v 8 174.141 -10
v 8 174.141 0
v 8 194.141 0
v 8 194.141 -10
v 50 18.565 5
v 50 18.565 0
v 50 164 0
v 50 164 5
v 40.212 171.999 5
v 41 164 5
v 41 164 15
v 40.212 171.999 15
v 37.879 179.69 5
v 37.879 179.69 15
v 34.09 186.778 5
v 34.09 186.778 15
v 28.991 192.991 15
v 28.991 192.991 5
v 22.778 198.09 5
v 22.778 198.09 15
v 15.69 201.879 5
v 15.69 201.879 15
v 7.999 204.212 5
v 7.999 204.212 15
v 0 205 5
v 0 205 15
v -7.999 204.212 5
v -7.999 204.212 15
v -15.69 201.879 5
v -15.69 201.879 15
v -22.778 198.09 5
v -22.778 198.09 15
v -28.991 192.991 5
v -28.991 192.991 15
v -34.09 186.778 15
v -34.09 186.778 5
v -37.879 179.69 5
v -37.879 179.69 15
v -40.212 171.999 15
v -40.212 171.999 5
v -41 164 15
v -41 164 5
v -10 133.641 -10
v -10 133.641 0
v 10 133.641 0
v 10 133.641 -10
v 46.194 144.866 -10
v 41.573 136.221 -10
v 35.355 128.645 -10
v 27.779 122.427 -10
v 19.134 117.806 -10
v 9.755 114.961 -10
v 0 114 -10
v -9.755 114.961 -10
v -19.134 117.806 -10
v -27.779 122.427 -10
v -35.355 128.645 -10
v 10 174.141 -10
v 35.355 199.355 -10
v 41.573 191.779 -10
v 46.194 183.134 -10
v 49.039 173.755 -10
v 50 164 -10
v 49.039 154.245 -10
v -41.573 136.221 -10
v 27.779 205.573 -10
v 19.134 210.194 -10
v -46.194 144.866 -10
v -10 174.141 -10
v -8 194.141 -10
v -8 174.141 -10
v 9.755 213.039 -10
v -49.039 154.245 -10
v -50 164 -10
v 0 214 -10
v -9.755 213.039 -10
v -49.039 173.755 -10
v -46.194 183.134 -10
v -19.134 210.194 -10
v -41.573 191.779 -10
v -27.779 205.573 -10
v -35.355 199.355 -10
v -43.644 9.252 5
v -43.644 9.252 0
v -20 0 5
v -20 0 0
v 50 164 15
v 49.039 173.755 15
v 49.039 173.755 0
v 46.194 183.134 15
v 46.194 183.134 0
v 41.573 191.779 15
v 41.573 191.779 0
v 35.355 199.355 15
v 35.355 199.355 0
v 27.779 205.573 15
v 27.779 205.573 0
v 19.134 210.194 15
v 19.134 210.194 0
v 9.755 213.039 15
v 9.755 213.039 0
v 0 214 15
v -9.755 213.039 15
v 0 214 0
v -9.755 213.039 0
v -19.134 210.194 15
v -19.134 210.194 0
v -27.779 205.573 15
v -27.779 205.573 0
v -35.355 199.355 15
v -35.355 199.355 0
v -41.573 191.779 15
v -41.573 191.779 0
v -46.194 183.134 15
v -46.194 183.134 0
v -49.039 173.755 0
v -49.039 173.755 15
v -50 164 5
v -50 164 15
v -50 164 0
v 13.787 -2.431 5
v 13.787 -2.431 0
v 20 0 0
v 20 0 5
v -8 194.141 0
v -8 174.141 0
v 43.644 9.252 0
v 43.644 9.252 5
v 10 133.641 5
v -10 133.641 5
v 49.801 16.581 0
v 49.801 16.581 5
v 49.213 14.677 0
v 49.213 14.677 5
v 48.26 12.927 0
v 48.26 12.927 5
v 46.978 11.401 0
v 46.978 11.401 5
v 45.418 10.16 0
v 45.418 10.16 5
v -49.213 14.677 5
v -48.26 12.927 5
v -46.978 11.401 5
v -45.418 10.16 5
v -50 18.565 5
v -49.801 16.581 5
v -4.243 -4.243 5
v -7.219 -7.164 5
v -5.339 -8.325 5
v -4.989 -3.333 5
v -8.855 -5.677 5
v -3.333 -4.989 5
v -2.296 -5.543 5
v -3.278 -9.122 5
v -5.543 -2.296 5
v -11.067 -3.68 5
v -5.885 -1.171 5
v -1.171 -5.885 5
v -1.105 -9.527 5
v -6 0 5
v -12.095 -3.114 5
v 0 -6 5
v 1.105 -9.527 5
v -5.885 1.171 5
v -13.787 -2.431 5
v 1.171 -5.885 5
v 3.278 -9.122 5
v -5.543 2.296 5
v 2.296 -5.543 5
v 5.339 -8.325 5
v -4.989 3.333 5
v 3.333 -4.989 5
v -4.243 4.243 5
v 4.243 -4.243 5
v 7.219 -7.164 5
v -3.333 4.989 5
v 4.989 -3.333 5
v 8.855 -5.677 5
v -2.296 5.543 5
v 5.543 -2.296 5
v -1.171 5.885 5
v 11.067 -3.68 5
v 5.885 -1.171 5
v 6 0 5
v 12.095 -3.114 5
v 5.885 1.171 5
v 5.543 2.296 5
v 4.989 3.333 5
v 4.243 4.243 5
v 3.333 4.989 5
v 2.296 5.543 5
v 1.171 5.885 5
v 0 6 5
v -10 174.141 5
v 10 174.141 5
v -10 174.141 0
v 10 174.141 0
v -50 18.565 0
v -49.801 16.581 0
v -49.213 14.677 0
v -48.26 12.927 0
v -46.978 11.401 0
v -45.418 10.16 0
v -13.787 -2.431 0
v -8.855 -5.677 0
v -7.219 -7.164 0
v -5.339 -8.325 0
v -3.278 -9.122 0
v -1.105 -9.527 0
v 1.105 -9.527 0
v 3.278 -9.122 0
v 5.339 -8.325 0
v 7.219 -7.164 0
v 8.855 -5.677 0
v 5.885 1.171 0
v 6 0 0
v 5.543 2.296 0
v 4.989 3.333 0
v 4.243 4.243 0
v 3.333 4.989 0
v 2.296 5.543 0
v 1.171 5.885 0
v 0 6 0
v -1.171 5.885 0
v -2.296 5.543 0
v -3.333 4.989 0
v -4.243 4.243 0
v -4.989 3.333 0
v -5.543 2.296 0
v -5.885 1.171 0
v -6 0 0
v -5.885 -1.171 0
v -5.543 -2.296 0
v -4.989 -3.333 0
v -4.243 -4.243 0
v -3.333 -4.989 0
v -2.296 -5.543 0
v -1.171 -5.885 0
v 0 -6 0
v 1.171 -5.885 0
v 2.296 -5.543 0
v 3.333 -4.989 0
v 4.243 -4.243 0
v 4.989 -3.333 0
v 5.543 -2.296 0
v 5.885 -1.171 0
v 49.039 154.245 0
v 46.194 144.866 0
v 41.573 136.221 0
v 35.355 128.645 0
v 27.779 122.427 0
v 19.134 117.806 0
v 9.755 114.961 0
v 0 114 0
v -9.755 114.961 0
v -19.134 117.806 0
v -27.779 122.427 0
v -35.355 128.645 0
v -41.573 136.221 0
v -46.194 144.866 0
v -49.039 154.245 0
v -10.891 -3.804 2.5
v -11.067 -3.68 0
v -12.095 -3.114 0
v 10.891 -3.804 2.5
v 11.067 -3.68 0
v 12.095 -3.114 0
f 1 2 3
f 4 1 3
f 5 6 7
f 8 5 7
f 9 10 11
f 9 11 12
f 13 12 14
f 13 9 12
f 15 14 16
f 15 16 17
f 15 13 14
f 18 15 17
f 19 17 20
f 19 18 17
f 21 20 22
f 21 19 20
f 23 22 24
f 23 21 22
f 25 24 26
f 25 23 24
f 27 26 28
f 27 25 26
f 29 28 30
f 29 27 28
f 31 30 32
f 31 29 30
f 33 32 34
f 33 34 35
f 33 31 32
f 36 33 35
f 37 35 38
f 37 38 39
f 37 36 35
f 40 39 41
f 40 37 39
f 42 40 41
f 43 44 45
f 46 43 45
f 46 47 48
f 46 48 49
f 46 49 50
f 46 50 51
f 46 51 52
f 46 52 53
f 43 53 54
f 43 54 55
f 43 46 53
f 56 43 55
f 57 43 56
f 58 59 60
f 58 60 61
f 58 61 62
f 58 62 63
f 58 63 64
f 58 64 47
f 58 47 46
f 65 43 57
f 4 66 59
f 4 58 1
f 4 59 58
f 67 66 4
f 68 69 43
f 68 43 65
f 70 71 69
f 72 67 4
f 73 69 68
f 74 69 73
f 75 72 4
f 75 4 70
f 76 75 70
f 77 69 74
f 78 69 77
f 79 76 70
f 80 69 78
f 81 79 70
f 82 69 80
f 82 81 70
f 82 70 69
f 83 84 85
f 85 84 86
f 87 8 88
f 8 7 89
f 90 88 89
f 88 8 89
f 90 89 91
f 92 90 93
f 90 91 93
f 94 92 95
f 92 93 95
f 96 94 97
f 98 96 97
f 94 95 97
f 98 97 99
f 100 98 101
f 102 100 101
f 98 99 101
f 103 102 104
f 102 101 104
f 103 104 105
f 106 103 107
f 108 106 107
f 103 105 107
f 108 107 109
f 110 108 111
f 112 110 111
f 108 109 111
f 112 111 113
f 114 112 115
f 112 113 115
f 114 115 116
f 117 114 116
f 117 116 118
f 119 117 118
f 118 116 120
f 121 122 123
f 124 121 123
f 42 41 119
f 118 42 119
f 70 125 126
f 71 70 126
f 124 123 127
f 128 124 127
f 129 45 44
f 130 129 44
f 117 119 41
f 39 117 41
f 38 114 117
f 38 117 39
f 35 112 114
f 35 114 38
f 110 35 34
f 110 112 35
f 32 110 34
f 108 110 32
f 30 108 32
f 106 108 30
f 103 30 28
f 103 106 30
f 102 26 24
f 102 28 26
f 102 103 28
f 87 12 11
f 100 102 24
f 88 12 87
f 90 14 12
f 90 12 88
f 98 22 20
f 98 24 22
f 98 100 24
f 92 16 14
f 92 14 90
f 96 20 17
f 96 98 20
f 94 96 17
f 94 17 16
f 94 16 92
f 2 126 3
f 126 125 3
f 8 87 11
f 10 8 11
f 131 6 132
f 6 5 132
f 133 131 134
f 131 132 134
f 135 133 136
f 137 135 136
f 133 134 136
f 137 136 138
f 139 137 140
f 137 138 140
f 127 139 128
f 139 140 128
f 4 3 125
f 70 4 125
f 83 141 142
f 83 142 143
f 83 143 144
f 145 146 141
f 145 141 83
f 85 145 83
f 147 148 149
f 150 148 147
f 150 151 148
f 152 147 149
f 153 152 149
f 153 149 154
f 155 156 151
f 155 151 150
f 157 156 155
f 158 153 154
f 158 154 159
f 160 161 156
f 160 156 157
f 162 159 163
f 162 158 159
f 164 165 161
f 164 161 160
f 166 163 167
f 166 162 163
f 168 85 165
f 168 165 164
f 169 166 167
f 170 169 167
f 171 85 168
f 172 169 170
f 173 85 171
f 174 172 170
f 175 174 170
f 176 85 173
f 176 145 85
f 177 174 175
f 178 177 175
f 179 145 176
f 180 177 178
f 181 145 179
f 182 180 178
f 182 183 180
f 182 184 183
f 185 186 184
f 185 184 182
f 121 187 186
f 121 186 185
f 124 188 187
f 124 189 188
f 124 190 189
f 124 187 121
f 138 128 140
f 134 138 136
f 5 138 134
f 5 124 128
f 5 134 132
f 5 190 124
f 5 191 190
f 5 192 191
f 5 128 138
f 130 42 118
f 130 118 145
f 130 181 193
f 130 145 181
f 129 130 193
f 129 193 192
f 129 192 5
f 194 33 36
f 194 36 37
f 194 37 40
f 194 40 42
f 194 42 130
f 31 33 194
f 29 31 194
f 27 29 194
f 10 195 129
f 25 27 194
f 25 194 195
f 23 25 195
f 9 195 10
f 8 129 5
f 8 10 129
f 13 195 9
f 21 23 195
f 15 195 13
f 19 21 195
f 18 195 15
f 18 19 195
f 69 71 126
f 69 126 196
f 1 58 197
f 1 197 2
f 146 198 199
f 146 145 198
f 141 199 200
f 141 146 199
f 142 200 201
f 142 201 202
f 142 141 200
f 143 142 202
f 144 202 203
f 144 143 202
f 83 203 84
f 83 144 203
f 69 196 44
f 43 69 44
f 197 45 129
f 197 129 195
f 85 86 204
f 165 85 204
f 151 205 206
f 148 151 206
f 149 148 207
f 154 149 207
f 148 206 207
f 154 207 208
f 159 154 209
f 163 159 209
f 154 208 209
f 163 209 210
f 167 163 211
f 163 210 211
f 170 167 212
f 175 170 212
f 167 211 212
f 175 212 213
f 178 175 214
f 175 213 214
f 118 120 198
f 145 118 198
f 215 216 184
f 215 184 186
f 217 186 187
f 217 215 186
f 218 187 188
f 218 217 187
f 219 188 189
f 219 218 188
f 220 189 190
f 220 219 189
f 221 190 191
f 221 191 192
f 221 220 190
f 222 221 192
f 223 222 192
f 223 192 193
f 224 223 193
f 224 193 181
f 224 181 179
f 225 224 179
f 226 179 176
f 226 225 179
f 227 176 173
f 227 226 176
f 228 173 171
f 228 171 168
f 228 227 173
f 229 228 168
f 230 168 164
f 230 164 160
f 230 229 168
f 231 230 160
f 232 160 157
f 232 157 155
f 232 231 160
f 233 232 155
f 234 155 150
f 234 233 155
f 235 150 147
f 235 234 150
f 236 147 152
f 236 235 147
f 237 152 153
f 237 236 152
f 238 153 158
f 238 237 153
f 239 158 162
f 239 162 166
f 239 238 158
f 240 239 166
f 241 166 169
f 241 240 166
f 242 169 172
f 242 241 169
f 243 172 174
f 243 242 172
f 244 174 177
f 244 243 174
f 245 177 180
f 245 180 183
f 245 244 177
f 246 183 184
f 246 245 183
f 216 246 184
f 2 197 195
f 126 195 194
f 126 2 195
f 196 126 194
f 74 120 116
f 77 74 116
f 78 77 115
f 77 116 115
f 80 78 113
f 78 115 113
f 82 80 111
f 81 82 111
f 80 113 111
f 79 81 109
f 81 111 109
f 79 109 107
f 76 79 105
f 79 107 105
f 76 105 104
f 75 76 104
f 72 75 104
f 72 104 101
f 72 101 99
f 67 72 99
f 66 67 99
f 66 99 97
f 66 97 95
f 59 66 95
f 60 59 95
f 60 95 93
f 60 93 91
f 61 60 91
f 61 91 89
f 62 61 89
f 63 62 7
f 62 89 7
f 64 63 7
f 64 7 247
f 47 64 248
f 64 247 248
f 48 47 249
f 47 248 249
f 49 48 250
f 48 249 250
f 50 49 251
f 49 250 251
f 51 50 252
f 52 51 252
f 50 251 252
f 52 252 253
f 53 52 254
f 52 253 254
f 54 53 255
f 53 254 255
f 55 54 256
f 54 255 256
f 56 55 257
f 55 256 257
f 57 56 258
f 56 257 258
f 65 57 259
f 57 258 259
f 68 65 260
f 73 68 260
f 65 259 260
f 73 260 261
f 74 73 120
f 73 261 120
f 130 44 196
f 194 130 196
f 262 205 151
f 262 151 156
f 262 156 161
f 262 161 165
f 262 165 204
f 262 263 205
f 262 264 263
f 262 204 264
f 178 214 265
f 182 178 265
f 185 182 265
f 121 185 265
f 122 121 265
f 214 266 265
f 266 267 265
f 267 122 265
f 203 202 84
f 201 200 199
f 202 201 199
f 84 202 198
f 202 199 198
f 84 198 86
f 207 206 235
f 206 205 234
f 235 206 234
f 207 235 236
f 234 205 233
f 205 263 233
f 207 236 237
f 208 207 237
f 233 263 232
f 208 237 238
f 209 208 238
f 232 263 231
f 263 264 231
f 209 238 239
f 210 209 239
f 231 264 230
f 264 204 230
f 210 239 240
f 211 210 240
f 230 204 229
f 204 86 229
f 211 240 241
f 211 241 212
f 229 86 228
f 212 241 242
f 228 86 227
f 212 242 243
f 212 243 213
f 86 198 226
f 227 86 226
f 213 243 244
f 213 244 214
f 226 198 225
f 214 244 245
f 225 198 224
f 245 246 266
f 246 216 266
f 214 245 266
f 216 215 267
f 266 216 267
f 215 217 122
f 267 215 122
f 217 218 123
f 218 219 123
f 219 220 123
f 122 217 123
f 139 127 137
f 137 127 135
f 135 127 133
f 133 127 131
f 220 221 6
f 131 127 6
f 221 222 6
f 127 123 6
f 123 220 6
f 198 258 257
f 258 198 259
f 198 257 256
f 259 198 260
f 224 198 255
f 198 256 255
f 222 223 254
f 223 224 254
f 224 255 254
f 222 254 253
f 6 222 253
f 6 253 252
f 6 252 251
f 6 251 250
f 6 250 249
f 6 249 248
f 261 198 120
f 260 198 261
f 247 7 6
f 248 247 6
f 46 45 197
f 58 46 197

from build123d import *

# Parameters (mm, degrees)
CROQUIS1_R              = 6
SALIENTE_EXTRUIR1_DEPTH = 5
REDONDEO1_R             = 10
REDONDEO3_R             = 10
CROQUIS2_R              = 50
CROQUIS2_R_2            = 41
SALIENTE_EXTRUIR3_DEPTH = 10
CROQUIS3_W              = 20
CROQUIS3_H              = 40.5
CORTAR_EXTRUIR1_DEPTH   = 10
CORTAR_EXTRUIR2_DEPTH   = 10
CROQUIS5_R              = 50
SALIENTE_EXTRUIR4_DEPTH = 10


with BuildPart() as part:
    # Croquis1 → Saliente-Extruir1 (new body)
    with BuildSketch(Plane.XY):
        with BuildLine():
            ThreePointArc((50, 164), (0, 214), (-50, 164))
            Line((-50, 164), (-50, 11.739233328))
            Line((-50, 11.739233328), (-20, 0))
            Line((-20, 0), (-13.787308542, -2.431074487))
            add(Edge.make_bspline(
                [(-8.854817181, -5.677302066), (-9.51760475, -5.090344722), (-10.900654261, -3.469047842), (-12.711160318, -2.852179657), (-13.787308542, -2.431074487)],
                knots=[0.517708821, 0.517708821, 0.517708821, 0.517708821, 0.741171884, 1, 1, 1, 1], degree=3))
            ThreePointArc((-8.854817181, -5.677302066), (0, -9.578400122), (8.854817181, -5.677302066))
            add(Edge.make_bspline(
                [(8.854817181, -5.677302066), (9.51760475, -5.090344722), (10.900654261, -3.469047842), (12.711160318, -2.852179657), (13.787308542, -2.431074487)],
                knots=[0.517708821, 0.517708821, 0.517708821, 0.517708821, 0.741171884, 1, 1, 1, 1], degree=3))
            Line((13.787308542, -2.431074487), (20, 0))
            Line((20, 0), (50, 11.739233328))
            Line((50, 11.739233328), (50, 164))
        make_face()
        Circle(CROQUIS1_R, mode=Mode.SUBTRACT)
    extrude(amount=SALIENTE_EXTRUIR1_DEPTH)

    # Redondeo1
    redondeo1_edges = [part.edges().sort_by_distance(p)[0] for p in [
        (50, 11.739233328, 2.5),
    ]]
    fillet(redondeo1_edges, radius=REDONDEO1_R)

    # Redondeo3
    redondeo3_edges = [part.edges().sort_by_distance(p)[0] for p in [
        (-50, 11.739233328, 2.5),
    ]]
    fillet(redondeo3_edges, radius=REDONDEO3_R)

    # Croquis2 → Saliente-Extruir3 (add)
    with BuildSketch(Plane.XY.offset(5)):
        with Locations((0, 164)):
            Circle(CROQUIS2_R)
        with Locations((0, 164)):
            Circle(CROQUIS2_R_2, mode=Mode.SUBTRACT)
    extrude(amount=SALIENTE_EXTRUIR3_DEPTH)

    # Croquis3 → Cortar-Extruir1 (cut)
    with BuildSketch(Plane(origin=(0, 0, 0), x_dir=(-1, 0, 0), z_dir=(0, 0, -1))):
        with Locations((0, 153.891101056)):
            Rectangle(CROQUIS3_W, CROQUIS3_H)
    extrude(amount=-CORTAR_EXTRUIR1_DEPTH, mode=Mode.SUBTRACT)

    # Croquis4 → Cortar-Extruir2 (cut)
    with BuildSketch(Plane.XY.offset(15)):
        with BuildLine():
            Line((-41, 164), (-50, 164))
            ThreePointArc((-50, 164), (0, 114), (50, 164))
            Line((50, 164), (41, 164))
            ThreePointArc((41, 164), (0, 123), (-41, 164))
        make_face()
    extrude(amount=-CORTAR_EXTRUIR2_DEPTH, mode=Mode.SUBTRACT)

    # Croquis5 → Saliente-Extruir4 (add)
    with BuildSketch(Plane(origin=(0, 0, 0), x_dir=(-1, 0, 0), z_dir=(0, 0, -1))):
        with Locations((0, 164)):
            Circle(CROQUIS5_R)
        Polygon((-10, 174.141101056), (-8, 174.141101056), (-8, 194.141101056), (8, 194.141101056), (8, 174.141101056), (10, 174.141101056), (10, 133.641101056), (-10, 133.641101056), align=None, mode=Mode.SUBTRACT)
    extrude(amount=SALIENTE_EXTRUIR4_DEPTH)


solid = part.part
